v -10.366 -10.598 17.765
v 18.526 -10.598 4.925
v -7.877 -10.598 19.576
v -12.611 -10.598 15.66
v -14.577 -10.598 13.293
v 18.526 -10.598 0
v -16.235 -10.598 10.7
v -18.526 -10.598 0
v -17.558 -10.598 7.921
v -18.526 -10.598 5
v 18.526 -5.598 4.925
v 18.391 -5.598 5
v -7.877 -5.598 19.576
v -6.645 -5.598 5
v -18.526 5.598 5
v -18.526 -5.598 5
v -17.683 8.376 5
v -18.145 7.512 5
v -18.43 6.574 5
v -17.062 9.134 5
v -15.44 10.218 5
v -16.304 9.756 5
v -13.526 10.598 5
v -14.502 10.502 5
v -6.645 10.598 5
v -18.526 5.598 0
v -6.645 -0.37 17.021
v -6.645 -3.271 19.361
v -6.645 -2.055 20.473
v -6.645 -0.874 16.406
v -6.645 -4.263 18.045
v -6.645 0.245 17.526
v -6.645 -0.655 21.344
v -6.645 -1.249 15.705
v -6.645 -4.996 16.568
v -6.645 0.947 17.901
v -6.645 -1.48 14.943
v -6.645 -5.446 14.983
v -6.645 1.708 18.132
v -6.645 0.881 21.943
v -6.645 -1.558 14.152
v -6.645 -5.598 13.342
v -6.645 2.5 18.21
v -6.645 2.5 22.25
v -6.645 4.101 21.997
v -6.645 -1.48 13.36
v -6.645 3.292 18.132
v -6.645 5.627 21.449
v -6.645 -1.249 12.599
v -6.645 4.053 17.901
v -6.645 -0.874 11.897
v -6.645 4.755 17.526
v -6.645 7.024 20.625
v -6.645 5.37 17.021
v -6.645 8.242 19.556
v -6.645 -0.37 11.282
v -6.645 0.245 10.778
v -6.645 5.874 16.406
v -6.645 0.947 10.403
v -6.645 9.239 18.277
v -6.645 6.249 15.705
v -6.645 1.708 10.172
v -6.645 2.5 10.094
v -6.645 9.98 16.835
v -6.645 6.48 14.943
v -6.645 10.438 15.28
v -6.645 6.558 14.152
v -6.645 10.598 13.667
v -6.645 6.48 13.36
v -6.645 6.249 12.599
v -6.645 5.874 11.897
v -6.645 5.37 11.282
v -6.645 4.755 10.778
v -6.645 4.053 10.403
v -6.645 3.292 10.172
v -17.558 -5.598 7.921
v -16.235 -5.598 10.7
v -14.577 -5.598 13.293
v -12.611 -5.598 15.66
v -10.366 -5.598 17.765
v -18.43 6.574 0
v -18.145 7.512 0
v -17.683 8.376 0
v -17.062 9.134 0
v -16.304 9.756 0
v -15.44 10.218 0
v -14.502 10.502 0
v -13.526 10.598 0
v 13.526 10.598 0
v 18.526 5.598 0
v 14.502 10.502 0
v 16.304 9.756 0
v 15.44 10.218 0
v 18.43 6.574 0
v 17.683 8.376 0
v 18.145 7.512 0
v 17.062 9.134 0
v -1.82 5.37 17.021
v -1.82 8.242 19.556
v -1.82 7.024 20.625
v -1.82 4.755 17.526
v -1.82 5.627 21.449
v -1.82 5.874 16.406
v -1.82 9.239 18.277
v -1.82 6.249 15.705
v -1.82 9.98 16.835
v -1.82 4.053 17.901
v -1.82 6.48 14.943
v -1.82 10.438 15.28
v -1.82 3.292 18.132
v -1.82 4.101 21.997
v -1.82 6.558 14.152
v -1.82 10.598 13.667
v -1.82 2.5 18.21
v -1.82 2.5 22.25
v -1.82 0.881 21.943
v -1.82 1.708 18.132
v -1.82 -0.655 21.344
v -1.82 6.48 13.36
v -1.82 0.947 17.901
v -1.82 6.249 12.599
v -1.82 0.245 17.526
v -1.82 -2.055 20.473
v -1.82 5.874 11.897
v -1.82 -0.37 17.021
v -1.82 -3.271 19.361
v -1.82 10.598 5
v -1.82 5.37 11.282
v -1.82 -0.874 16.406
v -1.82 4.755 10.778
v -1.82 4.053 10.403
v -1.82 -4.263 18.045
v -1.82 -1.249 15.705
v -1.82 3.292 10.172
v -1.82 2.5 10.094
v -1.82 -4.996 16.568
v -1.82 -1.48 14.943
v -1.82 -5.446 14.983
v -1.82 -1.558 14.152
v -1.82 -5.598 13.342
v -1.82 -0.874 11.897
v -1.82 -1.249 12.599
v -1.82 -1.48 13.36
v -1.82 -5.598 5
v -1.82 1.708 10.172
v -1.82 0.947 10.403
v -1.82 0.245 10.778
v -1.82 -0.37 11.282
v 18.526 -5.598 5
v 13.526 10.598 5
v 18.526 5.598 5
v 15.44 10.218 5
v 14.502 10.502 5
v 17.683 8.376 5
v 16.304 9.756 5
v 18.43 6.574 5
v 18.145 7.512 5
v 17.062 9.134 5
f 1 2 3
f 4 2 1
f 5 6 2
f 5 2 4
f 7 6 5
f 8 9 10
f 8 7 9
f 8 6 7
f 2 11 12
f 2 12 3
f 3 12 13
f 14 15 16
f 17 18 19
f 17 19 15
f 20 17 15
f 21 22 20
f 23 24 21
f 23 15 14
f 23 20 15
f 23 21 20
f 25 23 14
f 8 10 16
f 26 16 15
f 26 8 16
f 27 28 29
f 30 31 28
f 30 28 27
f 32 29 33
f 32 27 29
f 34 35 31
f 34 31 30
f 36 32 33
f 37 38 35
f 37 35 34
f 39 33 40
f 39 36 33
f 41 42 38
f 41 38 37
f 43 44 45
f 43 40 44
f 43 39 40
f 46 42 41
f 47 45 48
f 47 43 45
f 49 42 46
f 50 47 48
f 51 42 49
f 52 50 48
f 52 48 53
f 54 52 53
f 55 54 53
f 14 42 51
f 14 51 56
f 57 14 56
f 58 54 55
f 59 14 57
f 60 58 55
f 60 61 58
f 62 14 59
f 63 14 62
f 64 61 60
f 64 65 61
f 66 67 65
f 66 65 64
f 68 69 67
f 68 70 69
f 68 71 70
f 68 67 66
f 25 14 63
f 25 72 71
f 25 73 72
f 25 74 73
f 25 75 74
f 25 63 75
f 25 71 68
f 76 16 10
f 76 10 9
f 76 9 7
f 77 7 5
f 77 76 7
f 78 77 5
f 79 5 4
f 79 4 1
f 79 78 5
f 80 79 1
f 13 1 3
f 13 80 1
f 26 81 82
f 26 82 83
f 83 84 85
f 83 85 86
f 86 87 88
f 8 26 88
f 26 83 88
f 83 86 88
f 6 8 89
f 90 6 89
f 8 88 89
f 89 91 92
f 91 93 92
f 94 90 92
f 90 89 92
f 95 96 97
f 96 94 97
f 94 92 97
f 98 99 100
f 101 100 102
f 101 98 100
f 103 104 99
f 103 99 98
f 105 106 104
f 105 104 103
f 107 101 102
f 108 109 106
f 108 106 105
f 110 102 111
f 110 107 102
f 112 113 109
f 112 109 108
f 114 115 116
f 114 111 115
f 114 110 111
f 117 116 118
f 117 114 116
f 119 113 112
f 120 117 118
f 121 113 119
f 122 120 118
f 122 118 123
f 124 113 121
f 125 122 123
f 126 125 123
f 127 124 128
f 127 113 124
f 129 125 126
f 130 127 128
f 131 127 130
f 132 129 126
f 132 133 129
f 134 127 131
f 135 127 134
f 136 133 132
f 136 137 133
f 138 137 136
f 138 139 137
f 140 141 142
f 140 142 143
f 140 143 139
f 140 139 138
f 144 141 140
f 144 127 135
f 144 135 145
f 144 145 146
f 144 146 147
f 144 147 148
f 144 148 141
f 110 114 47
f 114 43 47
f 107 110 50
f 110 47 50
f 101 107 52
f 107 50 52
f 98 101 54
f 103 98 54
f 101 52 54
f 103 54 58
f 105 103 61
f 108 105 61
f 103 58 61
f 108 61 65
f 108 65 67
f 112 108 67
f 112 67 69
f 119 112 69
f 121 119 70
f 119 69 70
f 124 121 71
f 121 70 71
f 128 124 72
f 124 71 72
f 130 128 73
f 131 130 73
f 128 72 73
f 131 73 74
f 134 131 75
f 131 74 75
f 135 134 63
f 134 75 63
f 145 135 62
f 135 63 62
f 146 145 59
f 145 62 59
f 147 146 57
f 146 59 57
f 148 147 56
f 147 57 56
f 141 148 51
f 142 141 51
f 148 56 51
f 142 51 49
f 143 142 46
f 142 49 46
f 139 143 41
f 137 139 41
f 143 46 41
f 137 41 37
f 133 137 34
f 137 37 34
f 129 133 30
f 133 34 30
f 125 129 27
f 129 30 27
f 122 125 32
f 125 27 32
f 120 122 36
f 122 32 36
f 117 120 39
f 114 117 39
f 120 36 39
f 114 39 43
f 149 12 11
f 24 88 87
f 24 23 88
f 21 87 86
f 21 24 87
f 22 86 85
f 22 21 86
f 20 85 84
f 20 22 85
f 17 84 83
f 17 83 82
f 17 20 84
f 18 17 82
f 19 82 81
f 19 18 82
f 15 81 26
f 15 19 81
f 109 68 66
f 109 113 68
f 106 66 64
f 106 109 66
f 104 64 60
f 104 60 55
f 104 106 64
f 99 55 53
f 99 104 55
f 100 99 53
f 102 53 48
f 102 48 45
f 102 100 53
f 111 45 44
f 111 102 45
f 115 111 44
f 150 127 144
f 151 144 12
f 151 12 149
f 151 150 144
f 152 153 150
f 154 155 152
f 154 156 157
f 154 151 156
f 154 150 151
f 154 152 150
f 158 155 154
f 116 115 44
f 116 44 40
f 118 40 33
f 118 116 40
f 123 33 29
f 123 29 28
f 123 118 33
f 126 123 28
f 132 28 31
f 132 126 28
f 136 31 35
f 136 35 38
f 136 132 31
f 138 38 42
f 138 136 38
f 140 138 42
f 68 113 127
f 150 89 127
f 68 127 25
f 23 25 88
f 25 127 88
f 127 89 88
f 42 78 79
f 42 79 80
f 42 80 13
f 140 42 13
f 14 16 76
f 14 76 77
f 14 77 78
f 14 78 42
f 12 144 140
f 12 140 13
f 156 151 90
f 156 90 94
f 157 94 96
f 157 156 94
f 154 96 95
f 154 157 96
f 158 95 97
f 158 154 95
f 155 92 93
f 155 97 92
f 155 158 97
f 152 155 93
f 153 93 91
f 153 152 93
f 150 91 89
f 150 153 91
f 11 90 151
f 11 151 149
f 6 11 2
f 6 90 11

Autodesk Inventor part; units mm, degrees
ref_plane "YZ Plane" through (0, 0, 0) normal (1, 0, 0) x (0, 1, 0)
ref_plane "XZ Plane" through (0, 0, 0) normal (0, 1, 0) x (-1, 0, 0)
ref_plane "XY Plane" through (0, 0, 0) normal (0, 0, 1) x (1, 0, 0)
sketch "스케치1" plane through (0, 0, 0) normal (0, 0, 1) x (1, 0, 0)
  line L0 (18.5261, -10.5982) -> (-18.5261, -10.5982)
  line L1 (-18.5261, -10.5982) -> (-18.5261, 10.5982)
  line L2 (-18.5261, 10.5982) -> (18.5261, 10.5982)
  line L3 (18.5261, 10.5982) -> (18.5261, -10.5982)
  line L4 (18.5261, -10.5982) -> (-18.5261, 10.5982) construction
  line L5 (-18.5261, -10.5982) -> (18.5261, 10.5982) construction
  point P0 (0, 0)
extrude "돌출1" add sketch "스케치1" along normal blind 5
sketch "스케치2" plane through (0, 0, 5) normal (0, 0, 1) x (1, 0, 0)
  line L0 (-18.5261, -10.5982) -> (18.5261, -10.5982) projected
  line L1 (-18.5261, 10.5982) -> (-18.5261, -10.5982) projected
  line L2 (18.5261, -10.5982) -> (-18.5261, -10.5982)
  line L3 (-18.5261, -10.5982) -> (-18.5261, -5.5982)
  line L4 (-18.5261, -5.5982) -> (18.5261, -5.5982)
  line L5 (18.5261, -5.5982) -> (18.5261, -10.5982)
  point P0 (0, 0)
  dimension "d2" = 5
extrude "돌출2" add sketch "스케치2" along normal blind 18.25
sketch "스케치3" plane through (-18.5261, -5.5982, 5) normal (0, 1, 0) x (1, 0, 0)
  line L0 (37.0522, 5) -> (37.0522, -18.25) projected
  line L1 (37.0522, 0.0749) -> (10.6495, -14.5756)
  line L2 (0, 5) -> (0, 0) projected
  arc A0 (0, 0) -> (10.6495, -14.5756) centre (23.9382, 6.3119) ccw
  line L3 (37.0522, 0.0749) -> (37.0522, -18.25)
  line L4 (37.0522, -18.25) -> (0, -18.25) projected
  line L5 (0, -18.25) -> (0, 0)
  point P0 (18.5261, 5)
extrude "돌출3" cut sketch "스케치3" against normal blind 18.25
sketch "스케치4" plane through (0, 0, 5) normal (0, 0, 1) x (1, 0, 0)
  line L0 (-18.5261, -5.5982) -> (18.391, -5.5982) projected
  line L1 (18.5261, 10.5982) -> (-18.5261, 10.5982) projected
  line L2 (-1.8195, -5.5982) -> (-6.6451, -5.5982)
  line L3 (-6.6451, -5.5982) -> (-6.6451, 10.5982)
  line L4 (-6.6451, 10.5982) -> (-1.8195, 10.5982)
  line L5 (-1.8195, 10.5982) -> (-1.8195, -5.5982)
  point P0 (0, 0)
extrude "돌출4" add sketch "스케치4" along normal blind 17.25
sketch "스케치5" plane through (-6.6451, -5.5982, 5) normal (-1, 0, 0) x (0, 0, 1)
  arc A0 (9.1518, 0) -> (9.1518, 16.1965) centre (9.1518, 8.0982) ccw
  line L0 (0, 16.1965) -> (17.25, 16.1965) projected
  line L1 (17.25, 16.1965) -> (17.25, 0) projected
  circle A1 centre (9.1518, 8.0982) radius 4.0581
  line L2 (14.5756, 0) -> (0, 0) projected
  line L3 (0, 16.1965) -> (17.25, 16.1965) projected
  line L4 (9.1518, 16.1965) -> (17.25, 16.1965)
  line L5 (17.25, 16.1965) -> (17.25, 8.0982)
  line L6 (17.25, 0) -> (17.25, 16.1965) projected
  line L7 (17.25, 0) -> (9.1518, 0)
  line L8 (11.2145, 0) -> (17.25, 0) projected
  line L9 (17.25, 8.0982) -> (17.25, 0)
  line L10 (17.25, 0) -> (9.1518, 0)
  point P0 (-5, 5.5982)
extrude "돌출5" cut sketch "스케치5" against normal blind 17.25 contours A1
sketch "스케치6" plane through (-1.8195, -5.5982, 5) normal (1, 0, 0) x (0, 0, -1)
  line L0 (-17.25, 16.1965) -> (-17.25, 0) projected
  line L1 (0, 16.1965) -> (-17.25, 16.1965) projected
  line L2 (-17.25, 8.0982) -> (-17.25, 16.1965)
  line L3 (-17.25, 16.1965) -> (-8.625, 16.1965)
  line L4 (-17.25, 0) -> (-17.25, 8.0982)
  line L5 (-11.2145, 0) -> (-17.25, 0) projected
  line L6 (-17.25, 0) -> (-8.3415, 0)
  line L7 (0, 0) -> (-14.5756, 0) projected
  arc A0 (-17.25, 8.0982) -> (-8.3415, 0) centre (-8.3415, 8.949) ccw
  arc A1 (-8.625, 16.1965) -> (-17.25, 8.0982) centre (-8.625, 7.5543) ccw
  point P0 (5, 5.5982)
extrude "돌출6" cut sketch "스케치6" against normal blind 17.25
fillet "모깎기1" radius 5 2 edges at (-18.5261, 10.5982, 2.5) (18.5261, 10.5982, 2.5)
properties part number "240628_final2"
